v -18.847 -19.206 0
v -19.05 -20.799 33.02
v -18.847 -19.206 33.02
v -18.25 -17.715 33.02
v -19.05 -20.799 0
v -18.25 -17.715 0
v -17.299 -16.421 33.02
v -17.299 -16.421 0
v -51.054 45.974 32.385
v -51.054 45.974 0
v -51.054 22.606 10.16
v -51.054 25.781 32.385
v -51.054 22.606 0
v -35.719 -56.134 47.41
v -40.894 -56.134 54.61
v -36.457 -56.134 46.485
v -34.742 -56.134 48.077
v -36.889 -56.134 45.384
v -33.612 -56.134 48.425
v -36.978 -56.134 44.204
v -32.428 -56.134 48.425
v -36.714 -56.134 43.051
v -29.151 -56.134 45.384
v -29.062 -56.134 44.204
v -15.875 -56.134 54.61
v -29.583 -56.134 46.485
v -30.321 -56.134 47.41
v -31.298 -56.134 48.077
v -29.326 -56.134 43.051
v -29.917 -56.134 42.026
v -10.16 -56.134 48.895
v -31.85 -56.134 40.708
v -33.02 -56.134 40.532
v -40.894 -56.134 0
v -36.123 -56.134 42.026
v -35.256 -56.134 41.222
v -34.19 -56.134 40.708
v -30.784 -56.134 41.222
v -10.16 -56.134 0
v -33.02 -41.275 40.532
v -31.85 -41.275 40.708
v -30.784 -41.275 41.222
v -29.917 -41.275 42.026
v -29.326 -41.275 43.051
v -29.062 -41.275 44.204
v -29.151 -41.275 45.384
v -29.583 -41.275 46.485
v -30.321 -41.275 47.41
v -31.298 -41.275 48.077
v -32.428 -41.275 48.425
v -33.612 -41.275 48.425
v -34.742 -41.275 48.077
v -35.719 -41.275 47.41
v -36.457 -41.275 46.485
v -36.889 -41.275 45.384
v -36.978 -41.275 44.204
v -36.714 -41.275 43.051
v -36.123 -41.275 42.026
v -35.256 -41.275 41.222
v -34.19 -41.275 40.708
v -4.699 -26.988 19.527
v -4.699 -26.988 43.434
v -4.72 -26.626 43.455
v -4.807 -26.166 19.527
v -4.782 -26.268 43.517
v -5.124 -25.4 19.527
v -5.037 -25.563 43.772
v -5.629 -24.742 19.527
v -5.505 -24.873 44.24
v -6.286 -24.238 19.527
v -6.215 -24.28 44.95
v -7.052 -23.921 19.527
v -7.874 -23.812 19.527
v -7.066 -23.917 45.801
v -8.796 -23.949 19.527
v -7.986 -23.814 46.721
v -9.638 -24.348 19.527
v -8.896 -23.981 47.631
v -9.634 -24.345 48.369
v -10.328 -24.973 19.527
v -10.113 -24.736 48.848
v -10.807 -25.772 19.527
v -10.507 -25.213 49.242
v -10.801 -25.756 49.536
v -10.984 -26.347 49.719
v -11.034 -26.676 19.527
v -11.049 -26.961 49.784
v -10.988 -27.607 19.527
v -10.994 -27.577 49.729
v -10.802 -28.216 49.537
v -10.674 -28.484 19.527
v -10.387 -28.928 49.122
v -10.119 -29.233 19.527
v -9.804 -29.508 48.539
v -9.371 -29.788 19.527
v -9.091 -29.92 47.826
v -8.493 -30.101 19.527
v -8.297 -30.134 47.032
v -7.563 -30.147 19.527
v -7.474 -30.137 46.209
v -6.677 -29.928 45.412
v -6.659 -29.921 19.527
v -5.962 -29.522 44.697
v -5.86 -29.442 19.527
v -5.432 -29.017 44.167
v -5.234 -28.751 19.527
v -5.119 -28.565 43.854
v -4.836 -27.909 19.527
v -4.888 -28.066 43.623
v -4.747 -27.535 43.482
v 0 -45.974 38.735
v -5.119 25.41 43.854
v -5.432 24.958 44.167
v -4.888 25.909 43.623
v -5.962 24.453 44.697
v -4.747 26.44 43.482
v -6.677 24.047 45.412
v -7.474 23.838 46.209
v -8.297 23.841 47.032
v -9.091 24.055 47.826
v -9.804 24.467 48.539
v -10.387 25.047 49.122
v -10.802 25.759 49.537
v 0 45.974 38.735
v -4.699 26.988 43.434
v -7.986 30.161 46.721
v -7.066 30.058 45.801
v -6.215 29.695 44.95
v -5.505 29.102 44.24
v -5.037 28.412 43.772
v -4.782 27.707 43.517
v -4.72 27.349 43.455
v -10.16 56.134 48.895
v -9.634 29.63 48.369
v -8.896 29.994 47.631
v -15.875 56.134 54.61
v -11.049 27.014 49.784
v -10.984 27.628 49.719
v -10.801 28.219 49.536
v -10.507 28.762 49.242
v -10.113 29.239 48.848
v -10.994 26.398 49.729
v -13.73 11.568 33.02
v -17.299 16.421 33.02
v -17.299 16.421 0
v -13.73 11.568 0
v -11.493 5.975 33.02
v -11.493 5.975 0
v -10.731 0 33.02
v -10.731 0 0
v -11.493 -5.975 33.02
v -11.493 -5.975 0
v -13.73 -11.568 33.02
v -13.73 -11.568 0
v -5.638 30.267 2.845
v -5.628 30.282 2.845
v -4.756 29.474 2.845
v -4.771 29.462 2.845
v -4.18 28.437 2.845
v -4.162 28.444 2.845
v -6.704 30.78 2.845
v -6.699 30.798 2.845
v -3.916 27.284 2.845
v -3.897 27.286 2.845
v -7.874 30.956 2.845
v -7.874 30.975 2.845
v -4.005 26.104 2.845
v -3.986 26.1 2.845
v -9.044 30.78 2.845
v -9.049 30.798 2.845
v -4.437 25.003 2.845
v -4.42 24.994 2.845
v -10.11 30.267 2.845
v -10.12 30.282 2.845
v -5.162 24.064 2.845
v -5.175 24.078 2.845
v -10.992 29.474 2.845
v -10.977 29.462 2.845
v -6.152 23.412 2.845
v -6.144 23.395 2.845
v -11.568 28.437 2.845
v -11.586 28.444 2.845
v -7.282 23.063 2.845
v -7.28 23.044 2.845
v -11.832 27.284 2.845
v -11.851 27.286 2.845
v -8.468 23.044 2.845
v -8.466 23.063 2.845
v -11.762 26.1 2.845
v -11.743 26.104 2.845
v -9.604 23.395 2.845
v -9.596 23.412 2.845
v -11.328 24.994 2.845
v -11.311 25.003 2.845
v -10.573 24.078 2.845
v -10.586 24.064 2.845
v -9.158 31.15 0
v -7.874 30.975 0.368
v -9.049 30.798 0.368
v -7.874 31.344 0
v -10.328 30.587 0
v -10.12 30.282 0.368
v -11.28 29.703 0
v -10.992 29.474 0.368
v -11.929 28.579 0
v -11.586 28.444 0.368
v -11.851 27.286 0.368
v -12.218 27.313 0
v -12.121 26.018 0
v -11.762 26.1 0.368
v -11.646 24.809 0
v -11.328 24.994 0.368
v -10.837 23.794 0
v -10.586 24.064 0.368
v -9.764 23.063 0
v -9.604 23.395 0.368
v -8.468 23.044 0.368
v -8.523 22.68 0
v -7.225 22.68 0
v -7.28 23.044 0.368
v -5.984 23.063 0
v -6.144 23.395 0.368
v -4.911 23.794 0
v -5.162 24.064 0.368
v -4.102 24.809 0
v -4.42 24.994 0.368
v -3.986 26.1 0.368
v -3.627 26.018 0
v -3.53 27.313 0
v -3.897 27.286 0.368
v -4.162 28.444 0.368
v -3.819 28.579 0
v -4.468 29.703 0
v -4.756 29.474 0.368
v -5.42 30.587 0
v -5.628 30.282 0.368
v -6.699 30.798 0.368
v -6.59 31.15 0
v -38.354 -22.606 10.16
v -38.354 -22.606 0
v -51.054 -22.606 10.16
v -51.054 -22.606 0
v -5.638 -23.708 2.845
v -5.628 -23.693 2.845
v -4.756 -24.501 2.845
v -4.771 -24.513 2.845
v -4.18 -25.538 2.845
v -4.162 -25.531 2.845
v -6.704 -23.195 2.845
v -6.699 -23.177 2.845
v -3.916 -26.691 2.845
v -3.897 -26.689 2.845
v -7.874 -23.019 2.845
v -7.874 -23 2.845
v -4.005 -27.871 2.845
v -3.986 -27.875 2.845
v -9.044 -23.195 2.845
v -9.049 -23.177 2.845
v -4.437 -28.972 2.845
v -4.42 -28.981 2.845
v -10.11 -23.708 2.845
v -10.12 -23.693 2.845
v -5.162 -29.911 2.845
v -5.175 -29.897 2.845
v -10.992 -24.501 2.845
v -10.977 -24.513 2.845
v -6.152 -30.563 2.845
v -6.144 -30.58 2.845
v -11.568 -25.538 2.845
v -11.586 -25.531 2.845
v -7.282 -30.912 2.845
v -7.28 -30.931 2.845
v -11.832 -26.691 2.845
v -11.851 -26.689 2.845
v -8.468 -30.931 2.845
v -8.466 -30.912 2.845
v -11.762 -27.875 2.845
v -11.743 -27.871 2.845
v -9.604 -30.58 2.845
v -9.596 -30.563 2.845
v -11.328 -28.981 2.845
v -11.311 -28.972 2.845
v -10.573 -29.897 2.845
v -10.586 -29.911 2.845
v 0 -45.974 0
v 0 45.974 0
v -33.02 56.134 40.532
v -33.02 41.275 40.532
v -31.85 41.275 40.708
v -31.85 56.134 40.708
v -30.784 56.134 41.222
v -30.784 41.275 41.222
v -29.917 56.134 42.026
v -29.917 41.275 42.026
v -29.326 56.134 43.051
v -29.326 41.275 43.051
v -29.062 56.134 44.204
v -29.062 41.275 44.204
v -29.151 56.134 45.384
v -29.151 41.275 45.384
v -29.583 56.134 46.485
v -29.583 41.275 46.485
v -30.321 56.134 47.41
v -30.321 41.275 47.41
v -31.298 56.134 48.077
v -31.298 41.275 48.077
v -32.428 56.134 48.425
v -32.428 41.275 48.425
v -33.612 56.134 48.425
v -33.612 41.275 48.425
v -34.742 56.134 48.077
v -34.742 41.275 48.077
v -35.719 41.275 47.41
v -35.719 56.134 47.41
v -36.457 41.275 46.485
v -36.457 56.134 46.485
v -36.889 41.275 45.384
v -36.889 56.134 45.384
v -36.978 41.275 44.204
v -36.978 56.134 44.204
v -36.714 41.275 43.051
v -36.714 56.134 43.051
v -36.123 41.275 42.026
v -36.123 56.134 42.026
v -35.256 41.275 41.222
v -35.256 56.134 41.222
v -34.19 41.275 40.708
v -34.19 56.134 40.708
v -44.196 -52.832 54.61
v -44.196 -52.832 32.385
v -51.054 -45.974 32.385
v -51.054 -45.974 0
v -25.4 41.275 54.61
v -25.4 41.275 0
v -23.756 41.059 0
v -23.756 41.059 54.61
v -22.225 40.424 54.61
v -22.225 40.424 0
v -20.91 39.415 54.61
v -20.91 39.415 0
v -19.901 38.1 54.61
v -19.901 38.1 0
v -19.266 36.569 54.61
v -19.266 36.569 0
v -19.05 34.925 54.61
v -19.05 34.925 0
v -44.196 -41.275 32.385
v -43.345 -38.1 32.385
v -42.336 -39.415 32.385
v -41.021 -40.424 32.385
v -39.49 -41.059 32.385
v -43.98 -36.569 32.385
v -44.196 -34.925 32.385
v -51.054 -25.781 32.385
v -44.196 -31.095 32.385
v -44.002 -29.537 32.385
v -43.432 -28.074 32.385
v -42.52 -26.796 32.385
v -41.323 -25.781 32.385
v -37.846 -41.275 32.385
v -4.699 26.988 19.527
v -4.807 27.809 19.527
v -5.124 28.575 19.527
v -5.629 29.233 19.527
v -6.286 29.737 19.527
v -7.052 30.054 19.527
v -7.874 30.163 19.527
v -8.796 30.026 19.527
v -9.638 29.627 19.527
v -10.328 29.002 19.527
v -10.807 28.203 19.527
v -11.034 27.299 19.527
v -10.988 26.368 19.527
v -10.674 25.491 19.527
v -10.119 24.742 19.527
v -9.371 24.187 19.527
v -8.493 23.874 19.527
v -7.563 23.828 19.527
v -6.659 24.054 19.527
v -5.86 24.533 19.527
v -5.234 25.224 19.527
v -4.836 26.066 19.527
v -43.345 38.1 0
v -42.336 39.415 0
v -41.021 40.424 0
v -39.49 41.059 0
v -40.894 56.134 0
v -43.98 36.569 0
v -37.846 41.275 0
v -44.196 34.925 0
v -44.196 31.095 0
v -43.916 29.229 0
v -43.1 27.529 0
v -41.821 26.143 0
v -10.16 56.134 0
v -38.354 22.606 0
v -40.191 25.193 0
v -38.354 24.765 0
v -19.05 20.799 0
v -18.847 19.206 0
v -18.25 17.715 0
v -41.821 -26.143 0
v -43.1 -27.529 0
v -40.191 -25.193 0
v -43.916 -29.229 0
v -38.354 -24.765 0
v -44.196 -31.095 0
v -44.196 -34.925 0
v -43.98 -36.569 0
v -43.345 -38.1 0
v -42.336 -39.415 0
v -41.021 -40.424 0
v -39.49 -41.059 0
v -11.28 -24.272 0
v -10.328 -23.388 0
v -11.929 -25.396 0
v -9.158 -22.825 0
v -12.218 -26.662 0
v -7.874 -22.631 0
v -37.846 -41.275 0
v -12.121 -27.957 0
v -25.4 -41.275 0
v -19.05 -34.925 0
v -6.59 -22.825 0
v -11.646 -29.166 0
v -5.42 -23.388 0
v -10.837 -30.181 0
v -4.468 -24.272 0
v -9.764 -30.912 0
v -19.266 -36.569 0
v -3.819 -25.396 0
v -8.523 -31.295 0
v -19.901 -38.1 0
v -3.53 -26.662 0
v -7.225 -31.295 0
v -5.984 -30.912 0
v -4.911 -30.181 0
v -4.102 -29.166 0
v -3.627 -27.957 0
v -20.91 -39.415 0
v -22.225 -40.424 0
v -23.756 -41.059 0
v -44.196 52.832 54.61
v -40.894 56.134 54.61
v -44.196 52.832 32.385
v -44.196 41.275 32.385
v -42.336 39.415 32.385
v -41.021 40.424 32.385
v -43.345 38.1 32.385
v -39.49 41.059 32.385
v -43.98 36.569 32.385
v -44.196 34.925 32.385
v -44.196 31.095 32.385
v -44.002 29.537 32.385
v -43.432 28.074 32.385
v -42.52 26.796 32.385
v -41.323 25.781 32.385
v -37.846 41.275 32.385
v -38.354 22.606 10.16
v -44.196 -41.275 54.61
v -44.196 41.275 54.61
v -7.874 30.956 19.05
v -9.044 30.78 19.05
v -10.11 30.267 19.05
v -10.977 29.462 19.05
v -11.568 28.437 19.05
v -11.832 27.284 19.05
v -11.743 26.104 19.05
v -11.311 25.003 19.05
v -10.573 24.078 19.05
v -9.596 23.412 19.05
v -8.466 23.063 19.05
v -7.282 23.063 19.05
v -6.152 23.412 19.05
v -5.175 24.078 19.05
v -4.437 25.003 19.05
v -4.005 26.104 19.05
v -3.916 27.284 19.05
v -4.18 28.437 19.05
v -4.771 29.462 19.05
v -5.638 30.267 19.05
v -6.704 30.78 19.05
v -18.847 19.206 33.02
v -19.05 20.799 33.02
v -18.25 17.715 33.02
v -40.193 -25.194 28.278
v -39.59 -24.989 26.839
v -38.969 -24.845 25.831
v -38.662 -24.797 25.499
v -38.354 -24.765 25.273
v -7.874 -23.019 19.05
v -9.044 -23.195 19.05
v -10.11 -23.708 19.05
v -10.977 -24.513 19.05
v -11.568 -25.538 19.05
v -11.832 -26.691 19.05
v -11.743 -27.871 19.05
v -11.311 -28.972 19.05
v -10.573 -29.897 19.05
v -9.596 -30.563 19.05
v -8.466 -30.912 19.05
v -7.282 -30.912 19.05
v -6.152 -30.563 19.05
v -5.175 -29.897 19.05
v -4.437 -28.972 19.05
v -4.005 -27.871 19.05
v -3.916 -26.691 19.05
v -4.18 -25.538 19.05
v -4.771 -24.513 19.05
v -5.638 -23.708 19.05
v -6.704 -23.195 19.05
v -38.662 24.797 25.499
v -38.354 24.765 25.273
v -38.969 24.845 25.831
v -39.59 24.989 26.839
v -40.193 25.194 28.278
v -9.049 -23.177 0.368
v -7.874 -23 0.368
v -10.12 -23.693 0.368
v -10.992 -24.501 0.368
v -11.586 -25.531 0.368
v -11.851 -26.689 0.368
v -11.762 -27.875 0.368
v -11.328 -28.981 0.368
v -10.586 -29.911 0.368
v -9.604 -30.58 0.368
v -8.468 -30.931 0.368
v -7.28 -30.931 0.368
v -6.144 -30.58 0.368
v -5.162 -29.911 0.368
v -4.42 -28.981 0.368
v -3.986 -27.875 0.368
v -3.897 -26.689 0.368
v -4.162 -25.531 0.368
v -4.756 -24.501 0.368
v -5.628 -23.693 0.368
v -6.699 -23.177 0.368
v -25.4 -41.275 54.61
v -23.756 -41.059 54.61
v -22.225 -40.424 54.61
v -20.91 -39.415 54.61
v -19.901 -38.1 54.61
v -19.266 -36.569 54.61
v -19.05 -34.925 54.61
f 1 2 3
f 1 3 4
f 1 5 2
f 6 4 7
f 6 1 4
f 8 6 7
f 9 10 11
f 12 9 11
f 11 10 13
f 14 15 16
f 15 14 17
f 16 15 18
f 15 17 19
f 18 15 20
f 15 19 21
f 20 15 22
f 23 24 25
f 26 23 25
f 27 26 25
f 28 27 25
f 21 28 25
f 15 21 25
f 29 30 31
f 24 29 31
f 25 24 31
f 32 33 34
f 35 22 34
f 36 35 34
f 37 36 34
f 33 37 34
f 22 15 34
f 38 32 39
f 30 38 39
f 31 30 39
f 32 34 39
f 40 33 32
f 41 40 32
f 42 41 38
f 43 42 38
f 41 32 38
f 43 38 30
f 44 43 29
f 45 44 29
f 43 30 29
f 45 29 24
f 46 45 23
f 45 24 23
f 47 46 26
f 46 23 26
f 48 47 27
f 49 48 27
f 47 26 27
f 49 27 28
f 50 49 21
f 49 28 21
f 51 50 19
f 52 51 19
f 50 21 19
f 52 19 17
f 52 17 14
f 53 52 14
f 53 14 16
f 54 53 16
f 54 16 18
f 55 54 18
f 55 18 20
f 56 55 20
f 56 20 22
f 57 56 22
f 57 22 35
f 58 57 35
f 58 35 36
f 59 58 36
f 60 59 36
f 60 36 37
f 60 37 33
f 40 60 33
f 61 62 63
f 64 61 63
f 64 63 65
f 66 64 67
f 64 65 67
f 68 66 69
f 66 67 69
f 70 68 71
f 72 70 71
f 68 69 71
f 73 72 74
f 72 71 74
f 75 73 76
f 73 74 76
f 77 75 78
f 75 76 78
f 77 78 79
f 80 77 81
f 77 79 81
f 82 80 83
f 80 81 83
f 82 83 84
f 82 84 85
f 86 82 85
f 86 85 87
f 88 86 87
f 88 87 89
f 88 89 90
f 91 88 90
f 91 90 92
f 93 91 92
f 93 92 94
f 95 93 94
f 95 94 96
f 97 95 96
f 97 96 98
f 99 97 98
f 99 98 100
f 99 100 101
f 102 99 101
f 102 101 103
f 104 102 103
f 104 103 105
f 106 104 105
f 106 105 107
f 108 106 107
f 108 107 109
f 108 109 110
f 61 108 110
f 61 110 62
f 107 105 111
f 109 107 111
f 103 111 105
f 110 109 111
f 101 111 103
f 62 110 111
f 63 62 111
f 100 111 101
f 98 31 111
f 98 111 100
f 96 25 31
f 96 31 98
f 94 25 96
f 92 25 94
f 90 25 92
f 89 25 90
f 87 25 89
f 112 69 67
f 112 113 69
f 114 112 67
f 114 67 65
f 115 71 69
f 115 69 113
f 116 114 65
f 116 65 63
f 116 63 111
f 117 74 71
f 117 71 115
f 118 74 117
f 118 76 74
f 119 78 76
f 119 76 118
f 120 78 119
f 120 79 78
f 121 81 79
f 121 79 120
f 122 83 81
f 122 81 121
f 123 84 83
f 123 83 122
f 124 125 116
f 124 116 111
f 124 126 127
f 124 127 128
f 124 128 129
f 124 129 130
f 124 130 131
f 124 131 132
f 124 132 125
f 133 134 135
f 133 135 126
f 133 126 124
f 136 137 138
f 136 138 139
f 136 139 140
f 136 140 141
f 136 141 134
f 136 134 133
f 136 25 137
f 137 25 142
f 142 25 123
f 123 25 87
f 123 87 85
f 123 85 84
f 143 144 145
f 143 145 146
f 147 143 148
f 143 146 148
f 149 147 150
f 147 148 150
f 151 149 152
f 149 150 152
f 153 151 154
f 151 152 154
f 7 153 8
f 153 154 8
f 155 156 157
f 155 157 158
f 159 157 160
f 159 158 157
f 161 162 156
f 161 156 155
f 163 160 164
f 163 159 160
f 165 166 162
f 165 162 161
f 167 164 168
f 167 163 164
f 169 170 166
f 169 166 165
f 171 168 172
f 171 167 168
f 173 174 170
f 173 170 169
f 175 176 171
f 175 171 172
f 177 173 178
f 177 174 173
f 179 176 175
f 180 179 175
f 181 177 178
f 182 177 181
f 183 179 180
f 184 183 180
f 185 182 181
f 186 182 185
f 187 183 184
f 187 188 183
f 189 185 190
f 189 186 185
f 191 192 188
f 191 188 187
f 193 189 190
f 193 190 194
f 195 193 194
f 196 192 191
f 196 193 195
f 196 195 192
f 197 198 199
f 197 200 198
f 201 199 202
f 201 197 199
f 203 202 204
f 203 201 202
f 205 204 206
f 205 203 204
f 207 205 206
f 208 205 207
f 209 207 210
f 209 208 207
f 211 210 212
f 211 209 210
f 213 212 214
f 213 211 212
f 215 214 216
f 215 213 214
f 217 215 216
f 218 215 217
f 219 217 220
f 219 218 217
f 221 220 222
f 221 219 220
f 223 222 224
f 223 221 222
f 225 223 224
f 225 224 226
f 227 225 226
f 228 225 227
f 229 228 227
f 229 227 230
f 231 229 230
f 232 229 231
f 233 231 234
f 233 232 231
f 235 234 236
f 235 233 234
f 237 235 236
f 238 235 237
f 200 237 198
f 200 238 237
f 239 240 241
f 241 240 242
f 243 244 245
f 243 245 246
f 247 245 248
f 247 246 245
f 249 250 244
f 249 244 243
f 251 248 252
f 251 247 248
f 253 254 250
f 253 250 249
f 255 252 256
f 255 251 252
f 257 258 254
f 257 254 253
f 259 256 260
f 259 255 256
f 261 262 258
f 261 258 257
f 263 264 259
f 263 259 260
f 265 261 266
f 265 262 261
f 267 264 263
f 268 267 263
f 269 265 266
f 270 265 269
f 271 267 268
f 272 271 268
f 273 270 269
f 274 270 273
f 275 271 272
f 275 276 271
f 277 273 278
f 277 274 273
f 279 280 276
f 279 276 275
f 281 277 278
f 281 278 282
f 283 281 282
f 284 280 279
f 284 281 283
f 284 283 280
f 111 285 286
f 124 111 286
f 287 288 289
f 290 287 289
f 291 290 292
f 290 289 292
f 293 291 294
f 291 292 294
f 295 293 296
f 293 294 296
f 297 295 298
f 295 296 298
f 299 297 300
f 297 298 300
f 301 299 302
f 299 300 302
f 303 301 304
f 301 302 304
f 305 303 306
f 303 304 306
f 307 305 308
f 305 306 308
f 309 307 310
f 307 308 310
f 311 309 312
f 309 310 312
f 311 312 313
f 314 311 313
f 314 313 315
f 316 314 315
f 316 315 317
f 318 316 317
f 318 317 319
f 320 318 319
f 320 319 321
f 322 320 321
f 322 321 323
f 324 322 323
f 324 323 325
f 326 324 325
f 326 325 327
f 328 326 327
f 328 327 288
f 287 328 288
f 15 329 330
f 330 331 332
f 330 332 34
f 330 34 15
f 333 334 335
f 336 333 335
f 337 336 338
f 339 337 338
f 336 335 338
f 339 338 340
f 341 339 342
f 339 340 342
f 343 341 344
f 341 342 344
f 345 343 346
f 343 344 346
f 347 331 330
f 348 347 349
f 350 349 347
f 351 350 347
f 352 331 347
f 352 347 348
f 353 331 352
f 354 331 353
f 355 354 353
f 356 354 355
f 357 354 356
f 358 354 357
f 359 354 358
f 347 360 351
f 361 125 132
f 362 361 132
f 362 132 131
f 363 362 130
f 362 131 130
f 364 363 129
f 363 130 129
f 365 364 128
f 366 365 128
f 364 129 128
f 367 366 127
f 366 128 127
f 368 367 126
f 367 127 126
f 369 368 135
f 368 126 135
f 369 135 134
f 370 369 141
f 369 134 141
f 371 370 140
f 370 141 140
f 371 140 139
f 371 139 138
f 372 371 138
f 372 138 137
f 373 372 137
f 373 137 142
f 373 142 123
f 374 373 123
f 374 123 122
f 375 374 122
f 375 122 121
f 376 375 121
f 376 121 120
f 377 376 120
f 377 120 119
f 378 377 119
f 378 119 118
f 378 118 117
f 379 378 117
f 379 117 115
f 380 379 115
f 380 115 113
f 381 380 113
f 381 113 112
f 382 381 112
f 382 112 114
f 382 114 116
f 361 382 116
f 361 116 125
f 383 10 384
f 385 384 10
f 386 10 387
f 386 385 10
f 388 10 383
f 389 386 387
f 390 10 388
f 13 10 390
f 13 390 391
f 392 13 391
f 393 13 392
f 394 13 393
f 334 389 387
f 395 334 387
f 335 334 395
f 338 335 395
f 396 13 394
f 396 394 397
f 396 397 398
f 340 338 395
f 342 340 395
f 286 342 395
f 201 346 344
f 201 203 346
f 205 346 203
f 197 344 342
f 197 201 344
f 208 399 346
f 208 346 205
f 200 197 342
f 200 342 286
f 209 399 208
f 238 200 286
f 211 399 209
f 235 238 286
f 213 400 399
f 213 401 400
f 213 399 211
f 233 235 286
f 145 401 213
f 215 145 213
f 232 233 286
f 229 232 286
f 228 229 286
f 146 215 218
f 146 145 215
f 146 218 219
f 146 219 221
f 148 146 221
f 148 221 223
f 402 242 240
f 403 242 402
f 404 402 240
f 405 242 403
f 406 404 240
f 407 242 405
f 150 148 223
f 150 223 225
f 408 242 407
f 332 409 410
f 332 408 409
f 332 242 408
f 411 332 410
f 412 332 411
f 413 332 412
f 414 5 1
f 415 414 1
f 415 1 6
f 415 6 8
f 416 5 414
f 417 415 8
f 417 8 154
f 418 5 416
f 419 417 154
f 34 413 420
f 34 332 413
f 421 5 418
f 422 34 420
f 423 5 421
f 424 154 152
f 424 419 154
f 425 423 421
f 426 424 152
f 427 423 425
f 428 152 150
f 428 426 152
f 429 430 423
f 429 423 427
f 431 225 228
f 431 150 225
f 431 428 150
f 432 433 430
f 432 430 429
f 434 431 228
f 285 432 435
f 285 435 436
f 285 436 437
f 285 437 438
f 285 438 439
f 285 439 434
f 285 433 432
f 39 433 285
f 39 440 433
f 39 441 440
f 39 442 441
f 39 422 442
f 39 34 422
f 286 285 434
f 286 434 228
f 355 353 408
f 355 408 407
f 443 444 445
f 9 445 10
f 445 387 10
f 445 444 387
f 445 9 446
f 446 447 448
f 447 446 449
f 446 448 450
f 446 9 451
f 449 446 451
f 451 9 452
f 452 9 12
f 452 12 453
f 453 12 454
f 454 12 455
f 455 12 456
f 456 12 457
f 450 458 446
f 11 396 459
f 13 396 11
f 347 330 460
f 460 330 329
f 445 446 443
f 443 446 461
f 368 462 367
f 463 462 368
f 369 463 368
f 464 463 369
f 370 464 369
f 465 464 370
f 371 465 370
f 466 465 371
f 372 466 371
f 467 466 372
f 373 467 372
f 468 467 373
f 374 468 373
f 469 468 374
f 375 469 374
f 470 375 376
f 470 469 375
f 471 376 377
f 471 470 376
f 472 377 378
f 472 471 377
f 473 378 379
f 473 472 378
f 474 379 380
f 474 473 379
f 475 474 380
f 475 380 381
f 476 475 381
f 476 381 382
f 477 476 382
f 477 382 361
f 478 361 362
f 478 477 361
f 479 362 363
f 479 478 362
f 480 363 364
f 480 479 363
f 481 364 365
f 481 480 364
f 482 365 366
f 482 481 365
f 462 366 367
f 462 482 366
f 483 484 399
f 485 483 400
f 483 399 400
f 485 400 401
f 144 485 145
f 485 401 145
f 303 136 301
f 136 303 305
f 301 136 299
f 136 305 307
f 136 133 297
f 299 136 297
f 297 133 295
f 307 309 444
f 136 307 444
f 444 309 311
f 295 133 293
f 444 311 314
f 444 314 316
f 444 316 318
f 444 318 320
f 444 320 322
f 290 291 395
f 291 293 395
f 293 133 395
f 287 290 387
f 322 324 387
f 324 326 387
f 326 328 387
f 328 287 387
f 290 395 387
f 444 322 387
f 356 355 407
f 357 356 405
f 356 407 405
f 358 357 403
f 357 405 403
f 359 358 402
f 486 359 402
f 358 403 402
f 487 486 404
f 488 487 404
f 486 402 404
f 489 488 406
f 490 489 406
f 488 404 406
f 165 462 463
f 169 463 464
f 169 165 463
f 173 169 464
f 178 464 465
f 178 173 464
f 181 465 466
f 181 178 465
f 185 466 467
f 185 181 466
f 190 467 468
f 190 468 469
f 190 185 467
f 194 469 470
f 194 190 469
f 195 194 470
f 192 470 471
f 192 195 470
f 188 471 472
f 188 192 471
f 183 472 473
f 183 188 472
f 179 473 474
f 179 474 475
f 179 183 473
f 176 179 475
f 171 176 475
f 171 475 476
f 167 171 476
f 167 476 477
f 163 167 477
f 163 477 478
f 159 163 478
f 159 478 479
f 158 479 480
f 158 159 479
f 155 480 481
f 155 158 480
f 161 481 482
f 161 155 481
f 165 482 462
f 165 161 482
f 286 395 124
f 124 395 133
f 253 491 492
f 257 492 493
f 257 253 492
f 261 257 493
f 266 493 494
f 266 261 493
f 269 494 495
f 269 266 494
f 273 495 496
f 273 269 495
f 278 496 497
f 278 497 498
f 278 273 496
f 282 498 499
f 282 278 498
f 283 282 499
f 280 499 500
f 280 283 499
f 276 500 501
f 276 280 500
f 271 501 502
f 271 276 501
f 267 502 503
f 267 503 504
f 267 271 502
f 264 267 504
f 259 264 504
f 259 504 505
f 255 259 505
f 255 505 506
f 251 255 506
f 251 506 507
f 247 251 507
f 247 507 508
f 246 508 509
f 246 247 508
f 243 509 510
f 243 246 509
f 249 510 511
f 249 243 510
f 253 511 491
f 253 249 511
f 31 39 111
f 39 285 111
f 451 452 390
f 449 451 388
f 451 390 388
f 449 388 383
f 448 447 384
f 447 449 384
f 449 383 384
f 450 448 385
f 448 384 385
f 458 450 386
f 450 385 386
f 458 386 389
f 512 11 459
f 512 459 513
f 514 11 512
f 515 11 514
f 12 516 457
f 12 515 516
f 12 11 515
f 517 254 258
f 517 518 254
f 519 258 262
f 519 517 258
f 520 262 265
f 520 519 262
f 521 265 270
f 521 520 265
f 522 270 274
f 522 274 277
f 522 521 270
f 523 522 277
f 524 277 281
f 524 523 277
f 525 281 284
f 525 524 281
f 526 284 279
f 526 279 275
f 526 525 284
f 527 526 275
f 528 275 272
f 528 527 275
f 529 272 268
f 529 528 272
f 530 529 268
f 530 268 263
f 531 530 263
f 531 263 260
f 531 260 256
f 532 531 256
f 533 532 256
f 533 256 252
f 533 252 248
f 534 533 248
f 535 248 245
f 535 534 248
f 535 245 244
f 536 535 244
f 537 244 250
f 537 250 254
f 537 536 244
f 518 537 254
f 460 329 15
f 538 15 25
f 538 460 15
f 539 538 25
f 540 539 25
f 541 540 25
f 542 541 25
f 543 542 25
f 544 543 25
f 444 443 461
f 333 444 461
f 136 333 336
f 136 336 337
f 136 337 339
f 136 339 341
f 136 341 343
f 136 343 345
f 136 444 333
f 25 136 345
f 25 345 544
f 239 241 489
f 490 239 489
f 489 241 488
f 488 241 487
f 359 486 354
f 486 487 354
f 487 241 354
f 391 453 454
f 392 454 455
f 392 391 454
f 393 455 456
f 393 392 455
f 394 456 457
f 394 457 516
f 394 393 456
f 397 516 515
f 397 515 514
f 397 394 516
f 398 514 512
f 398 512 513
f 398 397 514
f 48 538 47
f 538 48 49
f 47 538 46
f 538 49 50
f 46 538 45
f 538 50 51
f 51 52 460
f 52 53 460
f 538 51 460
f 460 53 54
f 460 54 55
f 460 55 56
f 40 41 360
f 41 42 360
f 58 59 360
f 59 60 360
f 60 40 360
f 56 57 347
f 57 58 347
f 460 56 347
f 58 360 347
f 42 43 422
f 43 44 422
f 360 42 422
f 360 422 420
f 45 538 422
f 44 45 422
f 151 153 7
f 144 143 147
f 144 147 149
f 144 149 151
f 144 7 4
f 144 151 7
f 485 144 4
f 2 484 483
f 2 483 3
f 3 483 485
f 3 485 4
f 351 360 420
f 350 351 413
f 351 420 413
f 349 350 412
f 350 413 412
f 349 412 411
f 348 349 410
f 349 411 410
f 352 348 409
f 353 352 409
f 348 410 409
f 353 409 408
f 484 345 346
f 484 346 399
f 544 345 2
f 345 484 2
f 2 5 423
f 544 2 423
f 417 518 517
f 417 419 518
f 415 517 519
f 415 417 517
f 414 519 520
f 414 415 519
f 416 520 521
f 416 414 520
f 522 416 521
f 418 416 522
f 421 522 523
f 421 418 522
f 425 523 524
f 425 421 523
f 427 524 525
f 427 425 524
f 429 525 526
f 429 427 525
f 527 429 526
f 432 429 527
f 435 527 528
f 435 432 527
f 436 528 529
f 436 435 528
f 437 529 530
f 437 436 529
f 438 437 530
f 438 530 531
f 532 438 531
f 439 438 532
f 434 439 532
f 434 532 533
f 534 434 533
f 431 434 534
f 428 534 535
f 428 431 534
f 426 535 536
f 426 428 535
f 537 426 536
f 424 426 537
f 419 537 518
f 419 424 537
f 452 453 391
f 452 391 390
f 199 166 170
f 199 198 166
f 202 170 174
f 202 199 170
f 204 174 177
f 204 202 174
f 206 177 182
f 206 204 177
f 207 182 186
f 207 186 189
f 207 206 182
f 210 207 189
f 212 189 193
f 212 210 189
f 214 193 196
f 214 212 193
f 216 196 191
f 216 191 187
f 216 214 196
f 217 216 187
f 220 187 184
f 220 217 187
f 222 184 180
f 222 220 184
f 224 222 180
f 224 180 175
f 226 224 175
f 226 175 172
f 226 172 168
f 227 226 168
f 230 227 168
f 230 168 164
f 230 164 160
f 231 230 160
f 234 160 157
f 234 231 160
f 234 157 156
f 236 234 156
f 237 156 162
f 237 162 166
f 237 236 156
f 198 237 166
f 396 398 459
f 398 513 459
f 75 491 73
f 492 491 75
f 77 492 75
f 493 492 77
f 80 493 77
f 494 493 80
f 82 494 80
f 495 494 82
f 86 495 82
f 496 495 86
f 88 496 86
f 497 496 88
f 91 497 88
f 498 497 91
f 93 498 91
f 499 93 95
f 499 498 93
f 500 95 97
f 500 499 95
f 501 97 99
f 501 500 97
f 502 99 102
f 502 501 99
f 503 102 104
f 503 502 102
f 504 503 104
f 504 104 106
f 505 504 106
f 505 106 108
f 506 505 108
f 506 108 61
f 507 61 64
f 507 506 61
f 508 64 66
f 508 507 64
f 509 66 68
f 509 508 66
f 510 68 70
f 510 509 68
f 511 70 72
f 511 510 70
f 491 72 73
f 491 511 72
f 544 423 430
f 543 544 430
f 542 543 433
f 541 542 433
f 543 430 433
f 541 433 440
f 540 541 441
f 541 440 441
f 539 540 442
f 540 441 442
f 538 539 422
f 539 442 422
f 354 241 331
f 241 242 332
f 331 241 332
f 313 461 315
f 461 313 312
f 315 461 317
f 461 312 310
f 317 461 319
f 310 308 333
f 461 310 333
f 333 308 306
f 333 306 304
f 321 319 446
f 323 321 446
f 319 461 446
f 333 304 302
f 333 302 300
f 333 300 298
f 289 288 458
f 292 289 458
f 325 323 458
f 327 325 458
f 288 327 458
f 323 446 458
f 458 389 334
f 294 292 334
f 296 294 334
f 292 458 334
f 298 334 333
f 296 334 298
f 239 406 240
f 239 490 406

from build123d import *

# Parameters (mm, degrees)
EXTRUDE1_DEPTH                                = 54.61
SKETCH6_R                                     = 3.96875
SKETCH6_W                                     = 6.858
SKETCH6_H                                     = 22.225
CUT_EXTRUDE1_DEPTH                            = 113.268
SKETCH8_W                                     = 6.35
SKETCH8_H                                     = 18.669
CUT_EXTRUDE2_DEPTH                            = 23.225
SKETCH13_R                                    = 23.8125
EXTRUDE4_DEPTH                                = 33.02
FILLET1_R                                     = 6.35
CBORE_FOR_1_4_SOCKET_HEAD_CAP_SCREW1_AT_COUNT = 2
CBORE_FOR_1_4_SOCKET_HEAD_CAP_SCREW1_AT_PITCH = 53.975
CHAMFER4_SIZE                                 = 10.16
CHAMFER7_SIZE                                 = 15.875
F_1_4_0_25_DIAMETER_HOLE1_D                   = 6.35
EXTRUDE9_DEPTH                                = 32.385
EXTRUDE8_DEPTH                                = 17.62


with BuildPart() as part:
    # Sketch5 → Extrude1 (new body)
    with BuildSketch(Plane.XY):
        with BuildLine():
            Line((0, -56.134), (0, 56.134))
            Line((0, 56.134), (-40.894, 56.134))
            Line((-40.894, 56.134), (-51.054, 45.974))
            Line((-51.054, 45.974), (-51.054, 22.606))
            Line((-51.054, 22.606), (-44.196, 22.606))
            Line((-44.196, 22.606), (-44.196, 34.925))
            ThreePointArc((-44.196, 34.925), (-42.336128061, 39.415128061), (-37.846, 41.275))
            Line((-37.846, 41.275), (-25.4, 41.275))
            ThreePointArc((-25.4, 41.275), (-20.909871939, 39.415128061), (-19.05, 34.925))
            Line((-19.05, 34.925), (-19.05, -34.925))
            ThreePointArc((-19.05, -34.925), (-20.909871939, -39.415128061), (-25.4, -41.275))
            Line((-25.4, -41.275), (-37.846, -41.275))
            ThreePointArc((-37.846, -41.275), (-42.336128061, -39.415128061), (-44.196, -34.925))
            Line((-44.196, -34.925), (-44.196, -22.606))
            Line((-44.196, -22.606), (-51.054, -22.606))
            Line((-51.054, -22.606), (-51.054, -45.974))
            Line((-51.054, -45.974), (-40.894, -56.134))
            Line((-40.894, -56.134), (0, -56.134))
        make_face()
    extrude(amount=EXTRUDE1_DEPTH)

    # Sketch6 → Cut-Extrude1 (cut, through all)
    with BuildSketch(Plane.XZ.offset(56.134)):
        with Locations(Location((-33.02, 44.5008, 0), (0, 0, 270))):  # turned: the seam where the file's is
            Circle(SKETCH6_R)
        with Locations((-47.625, 43.4975)):
            Rectangle(SKETCH6_W, SKETCH6_H)
    extrude(amount=-CUT_EXTRUDE1_DEPTH, mode=Mode.SUBTRACT)

    # Sketch8 → Cut-Extrude2 (cut, through all)
    with BuildSketch(Plane.XY.offset(32.385)):
        with Locations((-41.021, -31.9405)):
            Rectangle(SKETCH8_W, SKETCH8_H)
        with BuildLine():
            Line((-44.196, 34.925), (-44.196, 41.275))
            Line((-44.196, 41.275), (-37.846, 41.275))
            ThreePointArc((-37.846, 41.275), (-42.336128061, 39.415128061), (-44.196, 34.925))
        make_face()
    extrude(amount=CUT_EXTRUDE2_DEPTH, mode=Mode.SUBTRACT)

    # Sketch13 → Extrude4 (cut)
    with BuildSketch(Plane(origin=(0, 0, 0), x_dir=(-1, 0, 0), z_dir=(0, 0, -1))):
        with Locations((34.544, 0)):
            Circle(SKETCH13_R)
    extrude(amount=-EXTRUDE4_DEPTH, mode=Mode.SUBTRACT)

    # Fillet1
    fillet1_edges = [part.edges().sort_by_distance(p)[0] for p in [
        (-19.05, -18.082342775, 16.51),
        (-19.05, 18.082342775, 16.51),
    ]]
    fillet(fillet1_edges, radius=FILLET1_R)

    # Sketch18 → CBORE for 1/4 Socket Head Cap Screw1 (revolve, cut)
    with BuildSketch(Plane(origin=(-7.874, 26.9875, 0), x_dir=(0, 1, 0), z_dir=(1, 0, 0))):
        Polygon((0, 0), (0, 21.434665582), (3.96875, 19.05), (3.96875, 2.8448), (3.9878, 2.8448), (3.9878, 0.3683), (4.3561, 0), align=None)
    cbore_for_1_4_socket_head_cap_screw1 = revolve(axis=Axis((-7.874, 26.9875, -6.35), (0, 0, 1)), mode=Mode.SUBTRACT)

    # CBORE for 1/4 Socket Head Cap Screw1 at: CBORE for 1/4 Socket Head Cap Screw1 ×2
    with Locations(*[(0, -i * CBORE_FOR_1_4_SOCKET_HEAD_CAP_SCREW1_AT_PITCH, 0) for i in range(1, CBORE_FOR_1_4_SOCKET_HEAD_CAP_SCREW1_AT_COUNT)]):
        add(cbore_for_1_4_socket_head_cap_screw1, mode=Mode.SUBTRACT)

    # Chamfer4
    chamfer4_edges = [part.edges().sort_by_distance(p)[0] for p in [
        (0, 56.134, 27.305),
        (0, -56.134, 27.305),
    ]]
    chamfer(chamfer4_edges, length=CHAMFER4_SIZE)

    # Chamfer7
    chamfer7_edges = [part.edges().sort_by_distance(p)[0] for p in [
        (0, 0, 54.61),
    ]]
    chamfer(chamfer7_edges, length=CHAMFER7_SIZE)

    # 1/4 (0.25) Diameter Hole1 (through all)
    with Locations(Plane(origin=(0, 0, 0), x_dir=(-1, 0, 0), z_dir=(0, 0, -1))):
        with Locations((7.874, 26.9875), (7.874, -26.9875)):
            Hole(F_1_4_0_25_DIAMETER_HOLE1_D / 2)

    # Sketch22 → Extrude9 (add)
    with BuildSketch(Plane(origin=(0, 0, 0), x_dir=(-1, 0, 0), z_dir=(0, 0, -1))):
        with BuildLine():
            Line((38.354, -24.765), (38.354, -22.606))
            Line((38.354, -22.606), (44.196, -22.606))
            Line((44.196, -22.606), (44.196, -31.094647384))
            ThreePointArc((44.196, -31.094647384), (42.51227796, -26.787867844), (38.354, -24.765))
        make_face()
    extrude9 = extrude(amount=-EXTRUDE9_DEPTH)

    # Mirror3: Extrude9 across plane
    add(extrude9.mirror(Plane.ZX))

    # Sketch17 → Extrude8 (cut)
    with BuildSketch(Plane.ZY.offset(51.054)):
        Polygon((32.385, -25.781), (32.385, -22.606), (10.16, -22.606), align=None)
        Polygon((32.385, 25.781), (32.385, 22.606), (10.16, 22.606), align=None)
    extrude(amount=-EXTRUDE8_DEPTH, mode=Mode.SUBTRACT)


solid = part.part
